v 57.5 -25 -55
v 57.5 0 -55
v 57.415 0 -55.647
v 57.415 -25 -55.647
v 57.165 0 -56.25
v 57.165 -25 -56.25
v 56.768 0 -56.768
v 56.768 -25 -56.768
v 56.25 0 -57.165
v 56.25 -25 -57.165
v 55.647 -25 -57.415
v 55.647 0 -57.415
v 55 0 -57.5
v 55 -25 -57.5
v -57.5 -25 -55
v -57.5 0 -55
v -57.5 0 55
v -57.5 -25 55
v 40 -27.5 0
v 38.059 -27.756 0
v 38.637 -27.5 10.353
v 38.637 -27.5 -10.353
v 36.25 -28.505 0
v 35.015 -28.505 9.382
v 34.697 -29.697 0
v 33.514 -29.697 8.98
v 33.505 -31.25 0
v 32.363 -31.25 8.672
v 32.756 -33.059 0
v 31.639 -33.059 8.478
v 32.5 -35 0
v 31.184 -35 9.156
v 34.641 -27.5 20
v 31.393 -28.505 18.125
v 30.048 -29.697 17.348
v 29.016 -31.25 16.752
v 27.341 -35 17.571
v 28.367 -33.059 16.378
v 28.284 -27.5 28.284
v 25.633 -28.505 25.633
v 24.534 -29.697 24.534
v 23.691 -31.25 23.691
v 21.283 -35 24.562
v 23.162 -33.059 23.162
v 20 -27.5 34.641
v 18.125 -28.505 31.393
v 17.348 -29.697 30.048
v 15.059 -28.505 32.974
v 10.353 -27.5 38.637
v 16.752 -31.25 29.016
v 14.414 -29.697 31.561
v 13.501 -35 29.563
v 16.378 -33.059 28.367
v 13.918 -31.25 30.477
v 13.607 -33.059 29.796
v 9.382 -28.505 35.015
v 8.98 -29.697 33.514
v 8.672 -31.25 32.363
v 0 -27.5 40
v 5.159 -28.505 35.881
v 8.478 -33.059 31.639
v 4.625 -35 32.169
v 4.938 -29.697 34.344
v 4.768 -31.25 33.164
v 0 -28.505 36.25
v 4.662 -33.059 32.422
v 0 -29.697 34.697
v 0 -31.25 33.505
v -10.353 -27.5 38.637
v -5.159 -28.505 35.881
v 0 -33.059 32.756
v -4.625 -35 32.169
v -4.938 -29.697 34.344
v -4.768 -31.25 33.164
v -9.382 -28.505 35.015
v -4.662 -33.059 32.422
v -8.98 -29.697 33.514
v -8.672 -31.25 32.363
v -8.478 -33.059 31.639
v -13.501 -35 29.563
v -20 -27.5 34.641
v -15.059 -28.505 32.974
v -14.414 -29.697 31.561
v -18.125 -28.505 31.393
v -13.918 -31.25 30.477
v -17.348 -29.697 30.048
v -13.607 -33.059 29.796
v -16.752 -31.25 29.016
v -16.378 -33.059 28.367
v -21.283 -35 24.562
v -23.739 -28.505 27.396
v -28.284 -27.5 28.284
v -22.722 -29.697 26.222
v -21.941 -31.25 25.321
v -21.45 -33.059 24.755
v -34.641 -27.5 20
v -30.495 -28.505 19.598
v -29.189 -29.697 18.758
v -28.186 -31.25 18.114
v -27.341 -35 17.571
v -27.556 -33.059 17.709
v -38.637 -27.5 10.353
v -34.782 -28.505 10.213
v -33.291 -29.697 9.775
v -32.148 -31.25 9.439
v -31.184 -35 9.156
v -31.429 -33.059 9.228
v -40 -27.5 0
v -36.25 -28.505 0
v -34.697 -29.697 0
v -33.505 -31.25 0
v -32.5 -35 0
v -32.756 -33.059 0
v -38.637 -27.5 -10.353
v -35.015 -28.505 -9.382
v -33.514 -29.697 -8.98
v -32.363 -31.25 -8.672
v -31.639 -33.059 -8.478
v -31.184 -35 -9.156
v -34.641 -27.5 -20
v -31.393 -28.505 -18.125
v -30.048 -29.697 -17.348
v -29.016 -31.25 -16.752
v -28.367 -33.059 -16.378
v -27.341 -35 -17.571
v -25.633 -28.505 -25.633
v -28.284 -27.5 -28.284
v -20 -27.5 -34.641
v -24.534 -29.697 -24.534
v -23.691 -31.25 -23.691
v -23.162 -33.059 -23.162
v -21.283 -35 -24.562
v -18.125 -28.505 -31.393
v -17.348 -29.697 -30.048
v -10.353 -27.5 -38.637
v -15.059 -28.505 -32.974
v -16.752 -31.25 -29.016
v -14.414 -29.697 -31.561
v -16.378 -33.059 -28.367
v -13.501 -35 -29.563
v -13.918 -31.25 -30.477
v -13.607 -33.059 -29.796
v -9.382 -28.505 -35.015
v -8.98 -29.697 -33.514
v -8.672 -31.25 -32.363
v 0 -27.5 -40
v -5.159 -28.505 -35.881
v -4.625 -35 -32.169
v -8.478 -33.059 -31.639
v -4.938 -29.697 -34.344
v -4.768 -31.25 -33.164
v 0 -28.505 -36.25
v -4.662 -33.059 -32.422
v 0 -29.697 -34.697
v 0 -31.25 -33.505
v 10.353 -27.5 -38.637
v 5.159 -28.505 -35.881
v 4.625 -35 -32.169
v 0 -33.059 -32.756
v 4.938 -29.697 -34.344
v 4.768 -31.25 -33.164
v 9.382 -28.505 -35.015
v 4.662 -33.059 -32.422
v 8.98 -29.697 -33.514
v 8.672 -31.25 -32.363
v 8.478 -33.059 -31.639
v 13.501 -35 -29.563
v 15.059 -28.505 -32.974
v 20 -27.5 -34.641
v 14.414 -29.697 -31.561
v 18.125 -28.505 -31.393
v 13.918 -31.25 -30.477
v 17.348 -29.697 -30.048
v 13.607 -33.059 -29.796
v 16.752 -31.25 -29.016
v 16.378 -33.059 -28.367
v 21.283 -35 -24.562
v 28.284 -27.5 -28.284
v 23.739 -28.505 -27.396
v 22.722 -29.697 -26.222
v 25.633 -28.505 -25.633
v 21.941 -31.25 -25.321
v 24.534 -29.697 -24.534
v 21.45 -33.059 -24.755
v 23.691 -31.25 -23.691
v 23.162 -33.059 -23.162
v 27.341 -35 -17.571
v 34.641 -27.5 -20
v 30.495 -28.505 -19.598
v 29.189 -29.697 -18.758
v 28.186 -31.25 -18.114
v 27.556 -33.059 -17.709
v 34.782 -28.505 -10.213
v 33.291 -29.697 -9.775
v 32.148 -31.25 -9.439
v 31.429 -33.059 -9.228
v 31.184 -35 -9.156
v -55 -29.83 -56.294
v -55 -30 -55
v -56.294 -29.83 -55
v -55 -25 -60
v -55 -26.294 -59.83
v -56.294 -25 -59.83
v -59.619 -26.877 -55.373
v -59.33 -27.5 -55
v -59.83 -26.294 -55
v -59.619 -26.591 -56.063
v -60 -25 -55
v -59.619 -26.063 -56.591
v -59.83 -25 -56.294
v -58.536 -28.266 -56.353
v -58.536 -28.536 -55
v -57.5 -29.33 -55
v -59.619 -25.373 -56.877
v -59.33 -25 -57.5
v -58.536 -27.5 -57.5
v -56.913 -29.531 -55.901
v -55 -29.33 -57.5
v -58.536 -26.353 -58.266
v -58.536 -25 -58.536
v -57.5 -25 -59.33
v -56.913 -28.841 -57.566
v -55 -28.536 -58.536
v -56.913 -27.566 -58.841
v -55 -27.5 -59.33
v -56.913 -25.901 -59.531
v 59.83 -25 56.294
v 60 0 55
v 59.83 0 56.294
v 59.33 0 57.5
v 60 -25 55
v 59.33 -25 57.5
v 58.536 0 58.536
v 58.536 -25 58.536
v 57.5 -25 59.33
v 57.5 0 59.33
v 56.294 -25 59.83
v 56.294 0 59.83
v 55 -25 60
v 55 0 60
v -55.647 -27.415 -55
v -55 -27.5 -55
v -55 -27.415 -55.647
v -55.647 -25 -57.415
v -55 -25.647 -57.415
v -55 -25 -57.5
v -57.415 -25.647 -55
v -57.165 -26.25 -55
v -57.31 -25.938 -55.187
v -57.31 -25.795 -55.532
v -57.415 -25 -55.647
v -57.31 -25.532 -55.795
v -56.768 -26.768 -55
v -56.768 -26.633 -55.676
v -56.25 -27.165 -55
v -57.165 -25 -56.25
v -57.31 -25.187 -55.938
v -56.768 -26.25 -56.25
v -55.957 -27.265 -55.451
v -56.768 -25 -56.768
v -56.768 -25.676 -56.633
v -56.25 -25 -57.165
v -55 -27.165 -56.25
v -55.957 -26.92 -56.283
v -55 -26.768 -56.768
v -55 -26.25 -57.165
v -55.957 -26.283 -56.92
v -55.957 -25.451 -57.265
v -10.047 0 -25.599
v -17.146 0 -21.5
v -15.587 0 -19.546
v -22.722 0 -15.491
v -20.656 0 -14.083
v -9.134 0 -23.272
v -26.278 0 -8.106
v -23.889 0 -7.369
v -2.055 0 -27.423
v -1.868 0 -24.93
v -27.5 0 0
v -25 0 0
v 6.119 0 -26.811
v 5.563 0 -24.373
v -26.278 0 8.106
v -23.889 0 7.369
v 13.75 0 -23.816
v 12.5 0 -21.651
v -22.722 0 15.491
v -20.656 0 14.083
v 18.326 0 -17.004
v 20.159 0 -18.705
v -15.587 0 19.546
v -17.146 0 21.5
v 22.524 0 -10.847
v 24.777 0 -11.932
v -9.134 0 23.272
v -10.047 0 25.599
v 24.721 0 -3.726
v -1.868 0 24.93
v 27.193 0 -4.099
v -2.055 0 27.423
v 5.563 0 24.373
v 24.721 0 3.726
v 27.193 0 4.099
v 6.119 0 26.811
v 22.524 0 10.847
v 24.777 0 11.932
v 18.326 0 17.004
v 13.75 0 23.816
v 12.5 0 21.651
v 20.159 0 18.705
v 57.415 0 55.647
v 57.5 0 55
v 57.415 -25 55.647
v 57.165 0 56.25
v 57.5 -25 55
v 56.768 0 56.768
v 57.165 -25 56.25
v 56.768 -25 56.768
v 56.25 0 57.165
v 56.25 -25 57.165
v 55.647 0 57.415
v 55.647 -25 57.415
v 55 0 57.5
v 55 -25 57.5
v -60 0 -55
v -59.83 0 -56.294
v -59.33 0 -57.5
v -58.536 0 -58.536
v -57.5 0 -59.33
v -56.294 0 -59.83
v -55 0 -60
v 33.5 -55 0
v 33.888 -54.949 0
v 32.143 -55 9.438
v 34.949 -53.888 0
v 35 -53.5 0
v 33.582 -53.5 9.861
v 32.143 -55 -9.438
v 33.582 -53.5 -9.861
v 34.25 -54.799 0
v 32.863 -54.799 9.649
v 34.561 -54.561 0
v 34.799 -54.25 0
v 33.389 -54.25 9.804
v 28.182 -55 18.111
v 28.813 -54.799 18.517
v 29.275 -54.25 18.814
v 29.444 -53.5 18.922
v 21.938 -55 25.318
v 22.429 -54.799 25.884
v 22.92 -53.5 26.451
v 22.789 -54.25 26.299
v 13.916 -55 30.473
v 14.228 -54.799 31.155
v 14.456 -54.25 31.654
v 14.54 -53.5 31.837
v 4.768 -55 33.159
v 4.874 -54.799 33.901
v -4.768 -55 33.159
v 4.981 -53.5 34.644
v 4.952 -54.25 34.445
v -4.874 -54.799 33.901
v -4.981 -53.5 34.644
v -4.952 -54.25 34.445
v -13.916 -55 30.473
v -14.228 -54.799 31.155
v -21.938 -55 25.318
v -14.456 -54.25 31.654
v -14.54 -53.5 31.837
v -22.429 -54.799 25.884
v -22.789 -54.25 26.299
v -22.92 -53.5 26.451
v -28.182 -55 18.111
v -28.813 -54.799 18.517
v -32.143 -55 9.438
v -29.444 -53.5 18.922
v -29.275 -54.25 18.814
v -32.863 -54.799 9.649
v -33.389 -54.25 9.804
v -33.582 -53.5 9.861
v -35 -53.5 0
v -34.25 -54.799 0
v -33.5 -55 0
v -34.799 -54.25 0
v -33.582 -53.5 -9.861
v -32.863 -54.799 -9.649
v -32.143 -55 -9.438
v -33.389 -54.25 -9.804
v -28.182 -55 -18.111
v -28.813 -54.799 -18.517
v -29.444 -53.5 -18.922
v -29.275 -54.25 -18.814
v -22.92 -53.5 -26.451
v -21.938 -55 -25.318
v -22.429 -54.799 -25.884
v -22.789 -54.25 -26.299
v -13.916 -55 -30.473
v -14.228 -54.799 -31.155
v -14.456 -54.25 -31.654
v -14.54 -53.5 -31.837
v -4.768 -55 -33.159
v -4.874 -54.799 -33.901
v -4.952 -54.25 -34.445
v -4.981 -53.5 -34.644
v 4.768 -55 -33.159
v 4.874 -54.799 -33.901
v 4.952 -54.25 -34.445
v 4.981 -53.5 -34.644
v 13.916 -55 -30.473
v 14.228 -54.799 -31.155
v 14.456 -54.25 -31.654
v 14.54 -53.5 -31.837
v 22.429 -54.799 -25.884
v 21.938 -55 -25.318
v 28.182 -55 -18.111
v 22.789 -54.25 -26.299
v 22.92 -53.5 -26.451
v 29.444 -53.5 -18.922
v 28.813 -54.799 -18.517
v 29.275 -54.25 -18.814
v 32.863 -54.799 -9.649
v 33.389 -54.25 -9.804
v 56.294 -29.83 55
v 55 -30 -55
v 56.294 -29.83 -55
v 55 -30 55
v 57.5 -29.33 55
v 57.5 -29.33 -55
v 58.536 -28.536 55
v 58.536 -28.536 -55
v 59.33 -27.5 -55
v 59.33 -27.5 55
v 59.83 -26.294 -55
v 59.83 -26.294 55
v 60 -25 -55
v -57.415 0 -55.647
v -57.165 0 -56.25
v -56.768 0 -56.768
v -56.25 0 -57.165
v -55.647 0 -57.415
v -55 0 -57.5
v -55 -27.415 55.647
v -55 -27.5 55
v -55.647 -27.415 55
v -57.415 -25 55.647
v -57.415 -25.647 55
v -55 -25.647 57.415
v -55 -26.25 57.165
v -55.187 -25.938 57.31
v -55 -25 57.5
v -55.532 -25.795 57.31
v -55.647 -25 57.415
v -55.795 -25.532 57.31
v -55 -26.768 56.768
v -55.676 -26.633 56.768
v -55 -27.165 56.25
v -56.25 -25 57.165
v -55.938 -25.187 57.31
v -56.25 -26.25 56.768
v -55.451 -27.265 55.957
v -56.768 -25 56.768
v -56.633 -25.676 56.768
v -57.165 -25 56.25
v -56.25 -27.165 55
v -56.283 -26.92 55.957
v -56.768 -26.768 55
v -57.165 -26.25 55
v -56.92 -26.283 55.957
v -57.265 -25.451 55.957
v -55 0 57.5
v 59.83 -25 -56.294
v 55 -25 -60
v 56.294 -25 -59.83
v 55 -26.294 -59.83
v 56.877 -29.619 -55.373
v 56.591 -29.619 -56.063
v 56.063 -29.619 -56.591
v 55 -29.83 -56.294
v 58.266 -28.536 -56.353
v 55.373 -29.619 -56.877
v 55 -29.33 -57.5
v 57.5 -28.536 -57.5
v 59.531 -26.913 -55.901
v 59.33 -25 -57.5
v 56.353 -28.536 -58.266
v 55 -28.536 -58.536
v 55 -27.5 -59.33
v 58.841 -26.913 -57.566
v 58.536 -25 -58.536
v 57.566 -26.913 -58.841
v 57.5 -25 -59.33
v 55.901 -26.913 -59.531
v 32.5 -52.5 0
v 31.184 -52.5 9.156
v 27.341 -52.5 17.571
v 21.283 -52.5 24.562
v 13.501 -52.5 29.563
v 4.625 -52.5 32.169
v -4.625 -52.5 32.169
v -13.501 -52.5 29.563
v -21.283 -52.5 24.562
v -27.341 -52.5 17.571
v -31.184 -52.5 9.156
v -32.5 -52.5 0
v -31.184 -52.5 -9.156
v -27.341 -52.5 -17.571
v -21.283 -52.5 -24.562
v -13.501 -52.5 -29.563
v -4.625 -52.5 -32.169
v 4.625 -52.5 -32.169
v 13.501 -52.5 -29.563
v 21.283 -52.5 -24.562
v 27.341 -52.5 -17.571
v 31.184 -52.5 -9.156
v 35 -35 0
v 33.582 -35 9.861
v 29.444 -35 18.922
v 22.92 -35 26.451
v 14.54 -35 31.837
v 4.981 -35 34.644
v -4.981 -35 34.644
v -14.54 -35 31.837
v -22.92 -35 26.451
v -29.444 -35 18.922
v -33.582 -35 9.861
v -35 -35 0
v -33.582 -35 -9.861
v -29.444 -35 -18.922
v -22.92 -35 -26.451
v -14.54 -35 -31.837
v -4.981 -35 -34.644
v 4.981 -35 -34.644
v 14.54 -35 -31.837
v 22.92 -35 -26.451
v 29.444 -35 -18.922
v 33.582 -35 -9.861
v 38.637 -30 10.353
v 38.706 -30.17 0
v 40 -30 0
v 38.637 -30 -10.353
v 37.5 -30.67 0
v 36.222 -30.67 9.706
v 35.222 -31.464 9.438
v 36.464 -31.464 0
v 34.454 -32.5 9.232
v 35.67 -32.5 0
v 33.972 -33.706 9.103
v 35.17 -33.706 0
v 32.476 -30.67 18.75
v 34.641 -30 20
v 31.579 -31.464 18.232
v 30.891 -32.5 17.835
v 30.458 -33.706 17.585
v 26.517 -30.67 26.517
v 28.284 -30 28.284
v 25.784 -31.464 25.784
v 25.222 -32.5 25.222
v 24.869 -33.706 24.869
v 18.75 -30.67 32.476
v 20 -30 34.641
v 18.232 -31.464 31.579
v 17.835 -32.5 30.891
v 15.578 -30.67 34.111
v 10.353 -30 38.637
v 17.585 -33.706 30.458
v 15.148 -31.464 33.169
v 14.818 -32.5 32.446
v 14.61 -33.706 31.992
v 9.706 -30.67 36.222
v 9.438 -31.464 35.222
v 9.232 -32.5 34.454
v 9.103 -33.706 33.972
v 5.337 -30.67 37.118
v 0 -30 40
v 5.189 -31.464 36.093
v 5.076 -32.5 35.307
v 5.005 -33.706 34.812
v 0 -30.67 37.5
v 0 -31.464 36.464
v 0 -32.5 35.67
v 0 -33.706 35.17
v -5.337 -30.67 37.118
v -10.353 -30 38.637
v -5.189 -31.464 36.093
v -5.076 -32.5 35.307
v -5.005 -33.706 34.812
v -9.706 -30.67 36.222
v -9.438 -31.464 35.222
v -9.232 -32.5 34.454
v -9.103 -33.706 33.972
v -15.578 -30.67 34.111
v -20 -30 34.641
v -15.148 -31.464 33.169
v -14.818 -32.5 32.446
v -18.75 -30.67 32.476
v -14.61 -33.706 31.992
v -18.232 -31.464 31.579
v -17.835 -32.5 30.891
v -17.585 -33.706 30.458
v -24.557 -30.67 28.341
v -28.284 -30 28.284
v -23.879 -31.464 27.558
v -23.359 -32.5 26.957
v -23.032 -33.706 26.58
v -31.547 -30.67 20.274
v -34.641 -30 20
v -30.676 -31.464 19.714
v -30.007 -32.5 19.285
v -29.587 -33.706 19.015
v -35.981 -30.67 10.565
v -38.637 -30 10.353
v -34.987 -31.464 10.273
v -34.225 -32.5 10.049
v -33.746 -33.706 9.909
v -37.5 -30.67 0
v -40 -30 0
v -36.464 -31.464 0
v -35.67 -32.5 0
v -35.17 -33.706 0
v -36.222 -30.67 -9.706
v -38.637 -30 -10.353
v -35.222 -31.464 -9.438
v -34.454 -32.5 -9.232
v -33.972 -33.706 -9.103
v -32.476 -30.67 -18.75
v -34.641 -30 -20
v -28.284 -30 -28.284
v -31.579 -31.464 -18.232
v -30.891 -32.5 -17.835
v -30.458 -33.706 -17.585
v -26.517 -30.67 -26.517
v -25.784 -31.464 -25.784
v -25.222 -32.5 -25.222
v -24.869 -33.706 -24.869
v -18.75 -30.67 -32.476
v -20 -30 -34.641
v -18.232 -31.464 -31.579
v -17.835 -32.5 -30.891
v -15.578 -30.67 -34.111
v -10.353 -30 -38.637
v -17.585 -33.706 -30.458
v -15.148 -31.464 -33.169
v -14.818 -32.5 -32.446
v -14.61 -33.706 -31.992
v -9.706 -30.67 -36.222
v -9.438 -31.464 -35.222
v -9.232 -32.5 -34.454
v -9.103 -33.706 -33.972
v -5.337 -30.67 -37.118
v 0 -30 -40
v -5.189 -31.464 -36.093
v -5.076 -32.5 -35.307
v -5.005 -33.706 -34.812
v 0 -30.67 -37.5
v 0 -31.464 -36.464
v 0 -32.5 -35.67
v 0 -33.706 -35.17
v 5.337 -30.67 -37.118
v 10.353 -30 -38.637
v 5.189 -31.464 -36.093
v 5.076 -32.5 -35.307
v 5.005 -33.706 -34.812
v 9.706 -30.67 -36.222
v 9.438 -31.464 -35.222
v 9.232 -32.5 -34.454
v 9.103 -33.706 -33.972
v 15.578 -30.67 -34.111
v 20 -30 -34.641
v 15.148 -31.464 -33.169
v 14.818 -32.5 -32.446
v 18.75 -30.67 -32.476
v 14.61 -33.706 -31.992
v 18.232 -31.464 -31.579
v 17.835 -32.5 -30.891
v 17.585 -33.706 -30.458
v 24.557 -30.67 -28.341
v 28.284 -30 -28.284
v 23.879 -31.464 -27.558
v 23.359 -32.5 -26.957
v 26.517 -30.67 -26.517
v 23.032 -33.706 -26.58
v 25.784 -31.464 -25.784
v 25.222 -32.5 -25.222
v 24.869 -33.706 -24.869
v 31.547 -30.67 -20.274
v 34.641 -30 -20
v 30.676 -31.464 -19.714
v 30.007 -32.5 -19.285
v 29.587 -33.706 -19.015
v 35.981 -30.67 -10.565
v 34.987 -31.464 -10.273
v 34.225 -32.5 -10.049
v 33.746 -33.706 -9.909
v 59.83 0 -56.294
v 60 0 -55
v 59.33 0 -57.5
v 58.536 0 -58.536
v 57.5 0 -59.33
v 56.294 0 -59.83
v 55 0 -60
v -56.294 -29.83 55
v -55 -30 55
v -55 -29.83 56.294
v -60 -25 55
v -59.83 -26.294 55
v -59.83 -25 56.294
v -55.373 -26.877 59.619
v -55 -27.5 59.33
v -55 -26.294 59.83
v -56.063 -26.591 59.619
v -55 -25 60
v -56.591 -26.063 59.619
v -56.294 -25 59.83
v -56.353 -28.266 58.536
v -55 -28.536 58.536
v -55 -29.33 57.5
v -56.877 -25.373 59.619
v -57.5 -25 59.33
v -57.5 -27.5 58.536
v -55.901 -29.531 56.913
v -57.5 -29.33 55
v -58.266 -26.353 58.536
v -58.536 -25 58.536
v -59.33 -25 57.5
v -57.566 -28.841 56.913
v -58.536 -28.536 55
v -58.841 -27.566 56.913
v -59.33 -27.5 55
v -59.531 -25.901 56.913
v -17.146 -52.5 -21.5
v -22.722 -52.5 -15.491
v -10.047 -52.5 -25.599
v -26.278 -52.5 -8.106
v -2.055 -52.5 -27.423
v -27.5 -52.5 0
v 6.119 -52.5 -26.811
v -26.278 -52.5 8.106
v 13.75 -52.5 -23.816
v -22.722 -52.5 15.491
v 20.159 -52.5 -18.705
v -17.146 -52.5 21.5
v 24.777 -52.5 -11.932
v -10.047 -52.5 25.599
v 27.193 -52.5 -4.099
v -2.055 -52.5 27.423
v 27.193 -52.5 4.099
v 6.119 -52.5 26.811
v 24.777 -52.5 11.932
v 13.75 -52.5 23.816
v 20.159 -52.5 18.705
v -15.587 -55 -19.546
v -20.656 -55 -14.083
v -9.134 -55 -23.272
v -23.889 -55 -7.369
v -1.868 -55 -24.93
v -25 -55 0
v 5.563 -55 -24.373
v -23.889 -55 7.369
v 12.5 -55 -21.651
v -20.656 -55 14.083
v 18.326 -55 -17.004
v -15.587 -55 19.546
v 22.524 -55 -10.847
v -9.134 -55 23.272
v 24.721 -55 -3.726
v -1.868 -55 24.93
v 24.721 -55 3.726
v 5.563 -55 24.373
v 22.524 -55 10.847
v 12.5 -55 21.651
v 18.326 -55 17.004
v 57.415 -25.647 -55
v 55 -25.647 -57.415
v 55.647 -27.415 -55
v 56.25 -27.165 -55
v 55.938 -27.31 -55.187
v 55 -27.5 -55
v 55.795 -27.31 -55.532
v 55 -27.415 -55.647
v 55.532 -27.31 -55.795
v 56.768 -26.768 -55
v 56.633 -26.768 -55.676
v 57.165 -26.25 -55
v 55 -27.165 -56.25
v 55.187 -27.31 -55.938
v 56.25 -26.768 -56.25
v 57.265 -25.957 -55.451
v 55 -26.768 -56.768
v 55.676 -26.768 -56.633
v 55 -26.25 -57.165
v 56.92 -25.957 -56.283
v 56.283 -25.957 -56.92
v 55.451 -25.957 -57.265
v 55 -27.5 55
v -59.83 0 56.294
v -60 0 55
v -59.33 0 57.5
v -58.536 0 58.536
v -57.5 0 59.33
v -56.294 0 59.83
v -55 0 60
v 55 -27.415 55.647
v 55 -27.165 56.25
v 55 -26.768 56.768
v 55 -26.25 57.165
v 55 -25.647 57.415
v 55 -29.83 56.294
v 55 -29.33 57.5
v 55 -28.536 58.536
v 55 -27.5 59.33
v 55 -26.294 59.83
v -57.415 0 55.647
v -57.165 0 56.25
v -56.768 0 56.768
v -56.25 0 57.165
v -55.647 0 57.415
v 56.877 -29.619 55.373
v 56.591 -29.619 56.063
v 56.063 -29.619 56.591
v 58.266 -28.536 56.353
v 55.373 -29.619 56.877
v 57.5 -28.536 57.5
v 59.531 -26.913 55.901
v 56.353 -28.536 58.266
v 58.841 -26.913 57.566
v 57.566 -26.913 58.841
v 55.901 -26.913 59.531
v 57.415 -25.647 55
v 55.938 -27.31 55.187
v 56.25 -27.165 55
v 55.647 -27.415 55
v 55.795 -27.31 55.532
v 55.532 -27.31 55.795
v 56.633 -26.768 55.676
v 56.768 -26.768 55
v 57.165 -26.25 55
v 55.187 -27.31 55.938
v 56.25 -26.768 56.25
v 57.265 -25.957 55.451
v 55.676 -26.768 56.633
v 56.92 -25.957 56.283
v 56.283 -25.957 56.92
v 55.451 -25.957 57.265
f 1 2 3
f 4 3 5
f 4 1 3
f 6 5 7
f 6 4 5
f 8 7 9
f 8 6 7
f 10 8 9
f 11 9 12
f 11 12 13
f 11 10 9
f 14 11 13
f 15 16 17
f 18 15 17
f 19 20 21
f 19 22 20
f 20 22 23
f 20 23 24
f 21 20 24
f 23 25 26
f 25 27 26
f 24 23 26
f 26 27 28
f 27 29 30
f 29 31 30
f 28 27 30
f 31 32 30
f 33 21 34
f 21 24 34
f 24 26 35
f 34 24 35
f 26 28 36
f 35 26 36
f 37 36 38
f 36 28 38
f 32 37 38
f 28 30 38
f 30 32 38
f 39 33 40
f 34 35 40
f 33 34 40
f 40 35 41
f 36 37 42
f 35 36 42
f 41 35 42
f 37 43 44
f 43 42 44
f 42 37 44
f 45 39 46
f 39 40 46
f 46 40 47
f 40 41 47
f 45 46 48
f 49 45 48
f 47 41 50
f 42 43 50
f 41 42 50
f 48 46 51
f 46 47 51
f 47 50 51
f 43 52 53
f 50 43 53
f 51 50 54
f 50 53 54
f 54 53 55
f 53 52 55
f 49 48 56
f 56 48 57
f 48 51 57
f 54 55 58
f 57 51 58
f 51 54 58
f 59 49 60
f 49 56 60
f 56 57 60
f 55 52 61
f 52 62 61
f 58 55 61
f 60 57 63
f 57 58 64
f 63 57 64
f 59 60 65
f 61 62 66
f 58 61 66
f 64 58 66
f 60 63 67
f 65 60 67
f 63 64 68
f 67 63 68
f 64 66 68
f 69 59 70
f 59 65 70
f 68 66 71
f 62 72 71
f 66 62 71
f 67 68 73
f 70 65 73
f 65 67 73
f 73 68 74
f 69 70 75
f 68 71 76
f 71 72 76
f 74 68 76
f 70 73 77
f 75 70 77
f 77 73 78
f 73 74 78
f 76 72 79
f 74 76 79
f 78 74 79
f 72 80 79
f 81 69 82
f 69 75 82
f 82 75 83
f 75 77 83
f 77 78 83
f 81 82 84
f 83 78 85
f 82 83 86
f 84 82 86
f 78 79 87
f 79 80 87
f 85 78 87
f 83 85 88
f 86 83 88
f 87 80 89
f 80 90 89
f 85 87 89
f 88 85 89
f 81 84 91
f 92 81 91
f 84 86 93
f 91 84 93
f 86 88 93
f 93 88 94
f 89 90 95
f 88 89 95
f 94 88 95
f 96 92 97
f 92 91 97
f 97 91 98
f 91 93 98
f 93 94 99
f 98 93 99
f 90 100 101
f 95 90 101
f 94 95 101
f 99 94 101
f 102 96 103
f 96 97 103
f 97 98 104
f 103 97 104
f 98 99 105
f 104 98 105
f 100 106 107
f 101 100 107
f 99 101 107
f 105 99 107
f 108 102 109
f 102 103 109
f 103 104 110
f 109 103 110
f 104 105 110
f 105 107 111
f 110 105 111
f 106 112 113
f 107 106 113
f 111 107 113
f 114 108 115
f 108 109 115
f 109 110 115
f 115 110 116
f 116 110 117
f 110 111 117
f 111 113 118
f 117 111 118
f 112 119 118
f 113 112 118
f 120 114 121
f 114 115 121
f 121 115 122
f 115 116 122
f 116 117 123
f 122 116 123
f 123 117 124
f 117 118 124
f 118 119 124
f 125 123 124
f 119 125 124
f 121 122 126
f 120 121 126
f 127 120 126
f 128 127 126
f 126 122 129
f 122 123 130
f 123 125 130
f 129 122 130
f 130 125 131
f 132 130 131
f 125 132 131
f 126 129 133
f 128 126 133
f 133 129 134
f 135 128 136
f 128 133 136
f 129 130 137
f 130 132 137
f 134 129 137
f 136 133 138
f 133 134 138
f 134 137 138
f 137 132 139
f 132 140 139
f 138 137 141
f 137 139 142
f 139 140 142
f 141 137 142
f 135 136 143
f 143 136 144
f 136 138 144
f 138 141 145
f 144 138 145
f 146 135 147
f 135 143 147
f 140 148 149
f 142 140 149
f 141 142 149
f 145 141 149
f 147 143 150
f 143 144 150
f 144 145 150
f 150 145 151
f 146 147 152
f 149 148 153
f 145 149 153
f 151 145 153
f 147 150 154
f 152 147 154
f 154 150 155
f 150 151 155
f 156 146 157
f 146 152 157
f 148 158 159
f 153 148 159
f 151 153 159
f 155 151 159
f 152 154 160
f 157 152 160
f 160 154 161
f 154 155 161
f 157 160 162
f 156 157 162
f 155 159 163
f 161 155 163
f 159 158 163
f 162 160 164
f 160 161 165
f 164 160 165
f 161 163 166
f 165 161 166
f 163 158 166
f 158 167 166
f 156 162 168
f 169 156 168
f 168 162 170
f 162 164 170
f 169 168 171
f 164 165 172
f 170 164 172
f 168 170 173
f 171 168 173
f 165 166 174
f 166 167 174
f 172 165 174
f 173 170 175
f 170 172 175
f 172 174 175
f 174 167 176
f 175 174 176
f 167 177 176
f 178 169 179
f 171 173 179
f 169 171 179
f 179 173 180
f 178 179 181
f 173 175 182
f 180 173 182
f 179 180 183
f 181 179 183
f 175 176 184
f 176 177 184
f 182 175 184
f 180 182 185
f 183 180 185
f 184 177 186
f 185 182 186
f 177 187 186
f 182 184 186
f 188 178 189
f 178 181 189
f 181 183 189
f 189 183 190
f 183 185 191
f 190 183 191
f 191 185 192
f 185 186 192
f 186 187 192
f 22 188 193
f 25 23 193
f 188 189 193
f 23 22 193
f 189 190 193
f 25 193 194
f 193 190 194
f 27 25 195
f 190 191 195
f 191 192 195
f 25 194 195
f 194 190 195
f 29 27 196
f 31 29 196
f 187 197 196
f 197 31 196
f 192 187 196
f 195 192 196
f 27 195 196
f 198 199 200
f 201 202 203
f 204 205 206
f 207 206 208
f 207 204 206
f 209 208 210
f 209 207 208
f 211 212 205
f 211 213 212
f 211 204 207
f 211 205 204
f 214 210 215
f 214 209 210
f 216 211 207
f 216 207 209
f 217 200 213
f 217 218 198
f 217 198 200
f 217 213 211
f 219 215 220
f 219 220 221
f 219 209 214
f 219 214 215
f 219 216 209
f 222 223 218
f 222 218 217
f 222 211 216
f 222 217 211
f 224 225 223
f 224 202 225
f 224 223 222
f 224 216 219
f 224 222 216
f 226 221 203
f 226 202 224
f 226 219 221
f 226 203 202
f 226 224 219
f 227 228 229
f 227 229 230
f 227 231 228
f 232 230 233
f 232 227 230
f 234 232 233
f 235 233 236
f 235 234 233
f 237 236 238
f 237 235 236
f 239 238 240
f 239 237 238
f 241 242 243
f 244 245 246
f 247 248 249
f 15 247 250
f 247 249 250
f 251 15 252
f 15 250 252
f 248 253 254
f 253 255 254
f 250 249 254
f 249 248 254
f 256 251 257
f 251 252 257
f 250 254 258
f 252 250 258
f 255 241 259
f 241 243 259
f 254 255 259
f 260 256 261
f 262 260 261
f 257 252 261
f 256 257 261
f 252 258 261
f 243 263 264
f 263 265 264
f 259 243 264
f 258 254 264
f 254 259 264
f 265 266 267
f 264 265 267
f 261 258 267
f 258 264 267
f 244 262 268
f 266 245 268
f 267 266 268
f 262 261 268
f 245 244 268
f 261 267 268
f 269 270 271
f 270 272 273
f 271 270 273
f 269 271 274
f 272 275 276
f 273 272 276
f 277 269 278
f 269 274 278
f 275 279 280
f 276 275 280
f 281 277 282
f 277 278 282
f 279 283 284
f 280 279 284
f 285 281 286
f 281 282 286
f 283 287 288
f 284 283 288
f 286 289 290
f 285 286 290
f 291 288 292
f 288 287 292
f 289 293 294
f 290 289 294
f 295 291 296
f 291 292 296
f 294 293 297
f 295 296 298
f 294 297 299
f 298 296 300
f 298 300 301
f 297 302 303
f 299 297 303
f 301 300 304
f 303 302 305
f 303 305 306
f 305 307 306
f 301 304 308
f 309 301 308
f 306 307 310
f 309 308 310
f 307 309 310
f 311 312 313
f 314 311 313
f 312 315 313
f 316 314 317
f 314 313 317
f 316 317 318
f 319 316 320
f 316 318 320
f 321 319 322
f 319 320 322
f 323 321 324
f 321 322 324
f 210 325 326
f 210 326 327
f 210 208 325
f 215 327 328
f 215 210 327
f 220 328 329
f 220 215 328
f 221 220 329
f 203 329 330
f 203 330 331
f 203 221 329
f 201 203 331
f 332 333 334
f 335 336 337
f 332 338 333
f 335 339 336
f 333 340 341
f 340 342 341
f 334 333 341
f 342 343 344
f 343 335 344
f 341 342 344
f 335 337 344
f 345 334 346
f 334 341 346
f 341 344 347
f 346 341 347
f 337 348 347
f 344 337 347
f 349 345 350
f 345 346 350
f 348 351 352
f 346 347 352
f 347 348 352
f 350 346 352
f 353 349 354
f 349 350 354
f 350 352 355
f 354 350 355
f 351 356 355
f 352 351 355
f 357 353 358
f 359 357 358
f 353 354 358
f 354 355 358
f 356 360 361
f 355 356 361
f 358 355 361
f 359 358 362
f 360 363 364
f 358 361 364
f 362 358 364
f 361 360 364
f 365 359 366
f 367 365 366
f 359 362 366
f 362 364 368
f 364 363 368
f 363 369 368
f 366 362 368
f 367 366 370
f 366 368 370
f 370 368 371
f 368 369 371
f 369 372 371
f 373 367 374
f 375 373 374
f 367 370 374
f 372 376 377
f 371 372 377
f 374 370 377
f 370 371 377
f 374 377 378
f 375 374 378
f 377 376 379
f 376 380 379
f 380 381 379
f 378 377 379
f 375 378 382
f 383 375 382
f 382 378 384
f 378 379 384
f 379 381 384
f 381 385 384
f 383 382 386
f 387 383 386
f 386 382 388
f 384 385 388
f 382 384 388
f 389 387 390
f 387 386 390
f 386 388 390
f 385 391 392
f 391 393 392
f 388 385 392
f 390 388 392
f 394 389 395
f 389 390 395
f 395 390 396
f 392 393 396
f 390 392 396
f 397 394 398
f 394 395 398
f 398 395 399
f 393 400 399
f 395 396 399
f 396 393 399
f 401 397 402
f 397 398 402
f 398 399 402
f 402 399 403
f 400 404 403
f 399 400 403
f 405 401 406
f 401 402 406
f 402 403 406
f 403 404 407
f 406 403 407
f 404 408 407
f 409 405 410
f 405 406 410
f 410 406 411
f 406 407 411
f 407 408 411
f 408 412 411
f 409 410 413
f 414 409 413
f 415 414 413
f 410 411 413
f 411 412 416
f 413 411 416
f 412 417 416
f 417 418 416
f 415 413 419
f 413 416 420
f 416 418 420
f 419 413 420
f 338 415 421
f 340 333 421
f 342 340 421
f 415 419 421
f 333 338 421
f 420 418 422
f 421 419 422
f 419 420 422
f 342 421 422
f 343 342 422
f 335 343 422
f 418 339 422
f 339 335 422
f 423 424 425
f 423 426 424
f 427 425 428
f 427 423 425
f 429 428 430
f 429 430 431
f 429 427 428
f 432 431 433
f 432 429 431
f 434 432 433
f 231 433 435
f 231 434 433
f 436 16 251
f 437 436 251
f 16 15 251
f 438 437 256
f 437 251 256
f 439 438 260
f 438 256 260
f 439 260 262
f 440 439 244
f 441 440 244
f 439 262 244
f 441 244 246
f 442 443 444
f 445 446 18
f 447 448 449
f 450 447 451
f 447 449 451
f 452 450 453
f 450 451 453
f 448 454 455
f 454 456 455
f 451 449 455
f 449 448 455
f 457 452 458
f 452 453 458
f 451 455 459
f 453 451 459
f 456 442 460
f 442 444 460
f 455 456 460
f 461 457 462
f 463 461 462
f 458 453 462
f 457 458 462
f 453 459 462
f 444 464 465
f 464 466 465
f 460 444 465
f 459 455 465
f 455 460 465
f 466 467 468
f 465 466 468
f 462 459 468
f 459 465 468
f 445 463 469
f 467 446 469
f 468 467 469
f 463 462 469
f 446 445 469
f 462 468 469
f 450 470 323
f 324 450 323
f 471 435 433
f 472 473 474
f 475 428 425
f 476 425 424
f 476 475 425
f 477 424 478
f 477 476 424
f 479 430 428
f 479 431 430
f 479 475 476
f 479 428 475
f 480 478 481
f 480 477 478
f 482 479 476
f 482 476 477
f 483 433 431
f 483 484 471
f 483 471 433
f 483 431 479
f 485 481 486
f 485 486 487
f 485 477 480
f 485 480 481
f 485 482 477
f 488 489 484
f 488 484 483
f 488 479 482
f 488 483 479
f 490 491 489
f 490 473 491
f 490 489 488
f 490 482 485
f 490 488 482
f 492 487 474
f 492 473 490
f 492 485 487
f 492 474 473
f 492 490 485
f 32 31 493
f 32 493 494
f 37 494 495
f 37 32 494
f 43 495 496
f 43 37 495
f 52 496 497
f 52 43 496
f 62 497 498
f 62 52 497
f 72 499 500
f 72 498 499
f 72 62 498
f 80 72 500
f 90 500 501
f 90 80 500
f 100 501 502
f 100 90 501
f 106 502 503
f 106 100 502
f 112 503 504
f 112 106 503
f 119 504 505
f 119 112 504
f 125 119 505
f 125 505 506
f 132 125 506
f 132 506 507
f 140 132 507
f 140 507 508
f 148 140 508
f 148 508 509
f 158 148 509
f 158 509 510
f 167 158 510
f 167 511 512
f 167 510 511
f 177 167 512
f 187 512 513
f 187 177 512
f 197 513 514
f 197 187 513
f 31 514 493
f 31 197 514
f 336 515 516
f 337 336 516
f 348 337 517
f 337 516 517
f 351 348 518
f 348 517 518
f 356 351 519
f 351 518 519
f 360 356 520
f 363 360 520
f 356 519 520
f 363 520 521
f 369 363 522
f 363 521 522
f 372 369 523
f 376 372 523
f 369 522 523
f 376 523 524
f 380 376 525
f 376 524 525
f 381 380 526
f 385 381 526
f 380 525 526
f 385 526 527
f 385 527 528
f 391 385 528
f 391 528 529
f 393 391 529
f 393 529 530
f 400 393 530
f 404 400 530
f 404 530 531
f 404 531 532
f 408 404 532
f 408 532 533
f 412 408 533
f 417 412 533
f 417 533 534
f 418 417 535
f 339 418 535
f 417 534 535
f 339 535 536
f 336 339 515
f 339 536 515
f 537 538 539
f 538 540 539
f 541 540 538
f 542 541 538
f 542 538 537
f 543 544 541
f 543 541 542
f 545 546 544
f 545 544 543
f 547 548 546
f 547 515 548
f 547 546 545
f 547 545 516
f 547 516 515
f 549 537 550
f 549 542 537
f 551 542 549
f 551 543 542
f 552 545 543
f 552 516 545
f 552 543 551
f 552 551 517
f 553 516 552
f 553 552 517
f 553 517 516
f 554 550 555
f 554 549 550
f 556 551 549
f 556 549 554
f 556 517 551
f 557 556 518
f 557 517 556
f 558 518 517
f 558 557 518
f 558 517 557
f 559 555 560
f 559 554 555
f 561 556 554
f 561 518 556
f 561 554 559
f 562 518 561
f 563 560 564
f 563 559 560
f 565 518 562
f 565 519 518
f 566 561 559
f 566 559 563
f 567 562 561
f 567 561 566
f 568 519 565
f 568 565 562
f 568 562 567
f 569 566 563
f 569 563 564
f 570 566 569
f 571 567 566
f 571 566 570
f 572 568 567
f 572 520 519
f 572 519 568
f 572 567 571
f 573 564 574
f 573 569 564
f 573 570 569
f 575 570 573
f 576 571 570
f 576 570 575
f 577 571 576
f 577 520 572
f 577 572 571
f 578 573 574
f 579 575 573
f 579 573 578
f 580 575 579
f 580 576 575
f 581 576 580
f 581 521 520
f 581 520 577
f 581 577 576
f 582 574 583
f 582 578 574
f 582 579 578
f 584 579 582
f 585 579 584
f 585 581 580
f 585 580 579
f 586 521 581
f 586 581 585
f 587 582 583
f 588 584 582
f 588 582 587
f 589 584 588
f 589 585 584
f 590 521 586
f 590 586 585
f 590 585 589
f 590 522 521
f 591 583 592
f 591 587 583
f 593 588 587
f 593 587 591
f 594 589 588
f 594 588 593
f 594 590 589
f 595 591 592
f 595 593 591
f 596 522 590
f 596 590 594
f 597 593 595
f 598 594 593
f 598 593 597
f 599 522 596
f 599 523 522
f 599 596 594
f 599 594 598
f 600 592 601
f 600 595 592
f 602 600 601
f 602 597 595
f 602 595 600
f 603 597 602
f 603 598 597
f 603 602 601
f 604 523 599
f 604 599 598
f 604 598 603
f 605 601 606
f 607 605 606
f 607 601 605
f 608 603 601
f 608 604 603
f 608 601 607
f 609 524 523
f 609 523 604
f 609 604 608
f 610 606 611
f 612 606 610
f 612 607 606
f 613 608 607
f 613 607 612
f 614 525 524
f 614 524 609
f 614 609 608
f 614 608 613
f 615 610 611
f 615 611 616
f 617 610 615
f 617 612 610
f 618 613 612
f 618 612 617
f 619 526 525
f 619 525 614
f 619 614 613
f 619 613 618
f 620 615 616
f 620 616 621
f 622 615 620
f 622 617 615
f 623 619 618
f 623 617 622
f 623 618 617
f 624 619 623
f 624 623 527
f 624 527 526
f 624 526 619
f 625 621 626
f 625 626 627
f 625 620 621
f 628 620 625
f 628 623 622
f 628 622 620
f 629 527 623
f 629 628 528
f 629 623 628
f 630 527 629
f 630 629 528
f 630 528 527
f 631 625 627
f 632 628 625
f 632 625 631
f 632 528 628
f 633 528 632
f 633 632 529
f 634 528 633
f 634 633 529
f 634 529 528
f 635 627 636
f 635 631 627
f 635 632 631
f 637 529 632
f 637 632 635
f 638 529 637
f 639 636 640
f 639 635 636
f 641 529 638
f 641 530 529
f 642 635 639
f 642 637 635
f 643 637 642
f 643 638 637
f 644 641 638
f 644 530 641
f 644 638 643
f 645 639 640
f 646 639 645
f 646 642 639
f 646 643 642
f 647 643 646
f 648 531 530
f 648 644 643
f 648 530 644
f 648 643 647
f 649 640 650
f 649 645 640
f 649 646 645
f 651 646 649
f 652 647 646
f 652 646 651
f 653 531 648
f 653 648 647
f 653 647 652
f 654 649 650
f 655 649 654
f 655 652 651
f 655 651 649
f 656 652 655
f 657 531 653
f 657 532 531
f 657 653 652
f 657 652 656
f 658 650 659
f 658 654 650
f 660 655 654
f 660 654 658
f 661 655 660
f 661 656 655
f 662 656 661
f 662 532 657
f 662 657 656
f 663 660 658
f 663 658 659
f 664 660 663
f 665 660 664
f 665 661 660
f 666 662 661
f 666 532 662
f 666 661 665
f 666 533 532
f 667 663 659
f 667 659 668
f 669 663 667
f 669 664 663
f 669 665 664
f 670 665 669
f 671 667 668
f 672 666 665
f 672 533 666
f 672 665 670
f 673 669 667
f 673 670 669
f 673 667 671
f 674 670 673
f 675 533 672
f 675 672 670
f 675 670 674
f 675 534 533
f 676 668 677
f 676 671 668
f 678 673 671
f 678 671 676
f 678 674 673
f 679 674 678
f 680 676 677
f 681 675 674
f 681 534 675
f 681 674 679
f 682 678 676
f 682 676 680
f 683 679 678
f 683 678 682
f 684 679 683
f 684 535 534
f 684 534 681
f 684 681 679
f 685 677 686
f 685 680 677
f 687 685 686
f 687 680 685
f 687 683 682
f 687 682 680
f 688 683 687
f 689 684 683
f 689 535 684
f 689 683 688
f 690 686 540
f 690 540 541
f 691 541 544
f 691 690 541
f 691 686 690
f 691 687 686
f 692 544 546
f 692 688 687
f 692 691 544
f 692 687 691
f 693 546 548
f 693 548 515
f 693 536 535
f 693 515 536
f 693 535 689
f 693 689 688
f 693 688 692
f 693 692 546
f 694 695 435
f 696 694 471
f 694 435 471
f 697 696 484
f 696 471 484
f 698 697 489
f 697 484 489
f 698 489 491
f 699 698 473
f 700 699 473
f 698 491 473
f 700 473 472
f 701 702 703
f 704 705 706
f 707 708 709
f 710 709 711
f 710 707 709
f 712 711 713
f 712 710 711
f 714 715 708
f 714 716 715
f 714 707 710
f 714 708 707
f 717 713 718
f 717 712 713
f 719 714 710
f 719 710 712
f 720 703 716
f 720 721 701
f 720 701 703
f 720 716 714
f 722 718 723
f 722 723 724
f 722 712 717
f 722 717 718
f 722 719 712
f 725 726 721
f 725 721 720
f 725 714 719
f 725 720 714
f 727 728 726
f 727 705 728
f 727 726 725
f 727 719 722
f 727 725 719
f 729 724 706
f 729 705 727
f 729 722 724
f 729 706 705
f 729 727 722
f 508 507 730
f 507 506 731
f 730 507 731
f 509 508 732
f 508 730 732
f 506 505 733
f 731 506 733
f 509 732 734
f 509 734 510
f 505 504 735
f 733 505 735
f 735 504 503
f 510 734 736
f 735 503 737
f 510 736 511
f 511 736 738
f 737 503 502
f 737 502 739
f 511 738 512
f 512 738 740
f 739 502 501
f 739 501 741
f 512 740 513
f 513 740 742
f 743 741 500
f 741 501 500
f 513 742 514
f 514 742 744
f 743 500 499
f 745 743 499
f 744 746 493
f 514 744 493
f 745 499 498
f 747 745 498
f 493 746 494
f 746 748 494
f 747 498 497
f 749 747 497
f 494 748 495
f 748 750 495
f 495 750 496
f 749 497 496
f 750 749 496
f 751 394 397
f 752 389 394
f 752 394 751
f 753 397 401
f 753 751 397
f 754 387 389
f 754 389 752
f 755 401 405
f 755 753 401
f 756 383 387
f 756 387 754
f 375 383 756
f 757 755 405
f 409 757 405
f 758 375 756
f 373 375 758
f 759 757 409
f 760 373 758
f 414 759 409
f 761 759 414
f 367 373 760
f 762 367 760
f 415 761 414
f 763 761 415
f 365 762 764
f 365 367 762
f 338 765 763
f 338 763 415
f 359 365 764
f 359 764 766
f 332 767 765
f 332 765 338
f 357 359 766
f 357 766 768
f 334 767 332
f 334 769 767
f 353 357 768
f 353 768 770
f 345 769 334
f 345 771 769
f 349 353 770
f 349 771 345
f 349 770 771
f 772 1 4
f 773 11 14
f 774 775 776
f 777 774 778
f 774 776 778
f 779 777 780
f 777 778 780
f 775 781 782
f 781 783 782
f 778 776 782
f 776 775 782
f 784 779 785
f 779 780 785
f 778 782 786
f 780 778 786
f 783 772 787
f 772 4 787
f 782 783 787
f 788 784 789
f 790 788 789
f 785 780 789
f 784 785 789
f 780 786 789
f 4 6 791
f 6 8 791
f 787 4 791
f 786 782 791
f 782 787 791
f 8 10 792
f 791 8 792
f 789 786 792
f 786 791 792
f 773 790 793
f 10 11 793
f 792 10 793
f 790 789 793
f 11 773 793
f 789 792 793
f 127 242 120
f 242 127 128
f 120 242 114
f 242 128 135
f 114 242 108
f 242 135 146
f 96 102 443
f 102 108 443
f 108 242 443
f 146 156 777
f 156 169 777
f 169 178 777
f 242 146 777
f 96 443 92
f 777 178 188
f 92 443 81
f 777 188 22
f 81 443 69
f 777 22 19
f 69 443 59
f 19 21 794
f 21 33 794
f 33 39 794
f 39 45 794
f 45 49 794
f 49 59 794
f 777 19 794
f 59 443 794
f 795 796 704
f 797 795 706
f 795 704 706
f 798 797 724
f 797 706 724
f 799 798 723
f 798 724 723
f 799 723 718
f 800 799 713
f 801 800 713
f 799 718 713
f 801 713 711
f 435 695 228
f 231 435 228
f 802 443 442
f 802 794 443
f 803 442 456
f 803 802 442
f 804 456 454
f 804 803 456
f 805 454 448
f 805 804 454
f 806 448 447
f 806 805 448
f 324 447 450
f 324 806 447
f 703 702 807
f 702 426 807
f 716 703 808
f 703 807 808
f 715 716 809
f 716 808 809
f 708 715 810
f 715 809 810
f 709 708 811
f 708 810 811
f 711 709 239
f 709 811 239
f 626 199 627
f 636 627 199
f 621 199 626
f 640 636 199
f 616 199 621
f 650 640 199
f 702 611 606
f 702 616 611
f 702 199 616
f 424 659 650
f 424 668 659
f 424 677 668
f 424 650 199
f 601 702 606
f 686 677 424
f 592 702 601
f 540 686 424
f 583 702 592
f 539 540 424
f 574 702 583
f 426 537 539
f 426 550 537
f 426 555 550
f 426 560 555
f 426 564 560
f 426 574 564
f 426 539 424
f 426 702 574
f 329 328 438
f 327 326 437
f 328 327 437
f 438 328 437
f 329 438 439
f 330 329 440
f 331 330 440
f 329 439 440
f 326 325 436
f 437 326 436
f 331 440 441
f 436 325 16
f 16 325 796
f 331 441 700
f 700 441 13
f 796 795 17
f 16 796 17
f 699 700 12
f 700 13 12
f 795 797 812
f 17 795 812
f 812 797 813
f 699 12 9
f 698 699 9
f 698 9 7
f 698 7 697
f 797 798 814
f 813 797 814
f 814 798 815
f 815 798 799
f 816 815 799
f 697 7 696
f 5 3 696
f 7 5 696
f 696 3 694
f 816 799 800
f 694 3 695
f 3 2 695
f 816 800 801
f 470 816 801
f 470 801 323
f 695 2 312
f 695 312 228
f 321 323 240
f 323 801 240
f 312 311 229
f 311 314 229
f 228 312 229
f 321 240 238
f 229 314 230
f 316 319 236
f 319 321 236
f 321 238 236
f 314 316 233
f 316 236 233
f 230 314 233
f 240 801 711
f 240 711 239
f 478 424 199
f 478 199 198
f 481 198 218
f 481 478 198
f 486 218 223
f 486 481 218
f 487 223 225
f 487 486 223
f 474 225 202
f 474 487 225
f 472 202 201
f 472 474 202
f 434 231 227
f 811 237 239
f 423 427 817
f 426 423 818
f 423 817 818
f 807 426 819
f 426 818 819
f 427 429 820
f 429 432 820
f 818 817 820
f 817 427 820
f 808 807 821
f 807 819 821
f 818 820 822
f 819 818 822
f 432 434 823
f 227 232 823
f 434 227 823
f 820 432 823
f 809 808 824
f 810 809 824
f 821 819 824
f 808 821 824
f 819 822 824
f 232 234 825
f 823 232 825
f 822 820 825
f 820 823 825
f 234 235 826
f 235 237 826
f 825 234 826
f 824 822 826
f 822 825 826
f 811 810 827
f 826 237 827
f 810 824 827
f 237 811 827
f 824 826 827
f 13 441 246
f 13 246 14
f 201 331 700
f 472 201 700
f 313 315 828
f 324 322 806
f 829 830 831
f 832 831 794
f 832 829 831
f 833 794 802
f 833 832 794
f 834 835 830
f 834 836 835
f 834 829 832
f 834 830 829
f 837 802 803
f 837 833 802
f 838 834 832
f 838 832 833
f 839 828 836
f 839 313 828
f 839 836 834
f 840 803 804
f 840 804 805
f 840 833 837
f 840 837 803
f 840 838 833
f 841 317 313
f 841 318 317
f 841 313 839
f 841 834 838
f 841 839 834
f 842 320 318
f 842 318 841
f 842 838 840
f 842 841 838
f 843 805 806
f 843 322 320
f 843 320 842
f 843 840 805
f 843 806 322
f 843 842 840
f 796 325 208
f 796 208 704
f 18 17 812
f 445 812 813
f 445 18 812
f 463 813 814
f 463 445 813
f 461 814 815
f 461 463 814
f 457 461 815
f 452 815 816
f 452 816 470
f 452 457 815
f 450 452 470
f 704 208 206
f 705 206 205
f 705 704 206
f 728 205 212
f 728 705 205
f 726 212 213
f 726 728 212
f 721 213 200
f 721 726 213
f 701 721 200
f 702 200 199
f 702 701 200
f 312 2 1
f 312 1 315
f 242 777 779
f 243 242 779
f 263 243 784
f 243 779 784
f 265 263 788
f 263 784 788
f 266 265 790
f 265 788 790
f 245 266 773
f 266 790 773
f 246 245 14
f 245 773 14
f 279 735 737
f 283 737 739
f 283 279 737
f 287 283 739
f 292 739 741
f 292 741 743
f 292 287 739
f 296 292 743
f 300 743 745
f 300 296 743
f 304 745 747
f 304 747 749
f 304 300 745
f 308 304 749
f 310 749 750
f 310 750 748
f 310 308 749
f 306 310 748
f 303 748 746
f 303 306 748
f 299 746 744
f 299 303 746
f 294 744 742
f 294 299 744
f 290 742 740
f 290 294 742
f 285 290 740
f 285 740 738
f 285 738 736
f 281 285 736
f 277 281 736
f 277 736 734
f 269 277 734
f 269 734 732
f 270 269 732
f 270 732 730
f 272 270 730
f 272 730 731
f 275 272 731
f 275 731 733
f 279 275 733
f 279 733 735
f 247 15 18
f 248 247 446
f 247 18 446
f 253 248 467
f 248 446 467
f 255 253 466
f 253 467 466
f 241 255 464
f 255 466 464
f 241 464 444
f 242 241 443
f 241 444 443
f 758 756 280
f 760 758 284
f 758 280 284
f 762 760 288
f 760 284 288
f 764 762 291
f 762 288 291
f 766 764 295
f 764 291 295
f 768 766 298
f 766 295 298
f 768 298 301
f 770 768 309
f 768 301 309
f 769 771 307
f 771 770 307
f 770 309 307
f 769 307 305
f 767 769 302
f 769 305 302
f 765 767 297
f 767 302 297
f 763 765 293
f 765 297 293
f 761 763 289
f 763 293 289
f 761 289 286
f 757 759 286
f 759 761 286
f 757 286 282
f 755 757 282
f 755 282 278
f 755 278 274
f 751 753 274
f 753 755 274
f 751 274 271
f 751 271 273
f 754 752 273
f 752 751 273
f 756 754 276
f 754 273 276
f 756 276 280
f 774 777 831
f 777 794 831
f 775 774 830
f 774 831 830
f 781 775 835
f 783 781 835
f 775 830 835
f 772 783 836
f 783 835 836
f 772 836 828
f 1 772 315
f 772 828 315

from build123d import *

# Parameters (mm, degrees)
F0_W     = 120
F0_H     = 120
F1_DEPTH = 30
F2_R     = 35
F2_R_2   = 25
F3_DEPTH = 25
F4_R     = 25
F5_DEPTH = 55.001
F6_R     = 5
F7_R     = 1.5
F8_T     = -2.5


with BuildPart() as f1:
    # F0 (on Front) → F1 (new body)
    with BuildSketch(Plane.XZ):
        Rectangle(F0_W, F0_H)
    extrude(amount=F1_DEPTH)

    # F2 (on face) → F3 (join)
    with BuildSketch(Plane.XZ.offset(30)):
        Circle(F2_R)
        Circle(F2_R_2, mode=Mode.SUBTRACT)
    extrude(amount=F3_DEPTH)

    # F4 (on face) → F5 (cut, through all)
    with BuildSketch(Plane(origin=(0, 0, 0), x_dir=(-1, 0, 0), z_dir=(0, 1, 0))):
        Circle(F4_R)
    extrude(amount=-F5_DEPTH, mode=Mode.SUBTRACT)

    # F6
    f6_edges = [f1.edges().sort_by_distance(p)[0] for p in [
        (60, -15, 60),
        (60, -15, -60),
        (60, -30, 0),
        (0, -30, -60),
        (-60, -30, 0),
        (0, -30, 60),
        (-60, -15, 60),
        (-60, -15, -60),
        (-35, -30, 0),
    ]]
    fillet(f6_edges, radius=F6_R)

    # F7
    f7_edges = [f1.edges().sort_by_distance(p)[0] for p in [
        (-35, -55, 0),
    ]]
    fillet(f7_edges, radius=F7_R)

    # F8
    f8_openings = [f1.faces().sort_by_distance(p)[0] for p in [
        (0, 0, 58.302944),
    ]]
    offset(amount=F8_T, openings=f8_openings)


solid = f1.part
